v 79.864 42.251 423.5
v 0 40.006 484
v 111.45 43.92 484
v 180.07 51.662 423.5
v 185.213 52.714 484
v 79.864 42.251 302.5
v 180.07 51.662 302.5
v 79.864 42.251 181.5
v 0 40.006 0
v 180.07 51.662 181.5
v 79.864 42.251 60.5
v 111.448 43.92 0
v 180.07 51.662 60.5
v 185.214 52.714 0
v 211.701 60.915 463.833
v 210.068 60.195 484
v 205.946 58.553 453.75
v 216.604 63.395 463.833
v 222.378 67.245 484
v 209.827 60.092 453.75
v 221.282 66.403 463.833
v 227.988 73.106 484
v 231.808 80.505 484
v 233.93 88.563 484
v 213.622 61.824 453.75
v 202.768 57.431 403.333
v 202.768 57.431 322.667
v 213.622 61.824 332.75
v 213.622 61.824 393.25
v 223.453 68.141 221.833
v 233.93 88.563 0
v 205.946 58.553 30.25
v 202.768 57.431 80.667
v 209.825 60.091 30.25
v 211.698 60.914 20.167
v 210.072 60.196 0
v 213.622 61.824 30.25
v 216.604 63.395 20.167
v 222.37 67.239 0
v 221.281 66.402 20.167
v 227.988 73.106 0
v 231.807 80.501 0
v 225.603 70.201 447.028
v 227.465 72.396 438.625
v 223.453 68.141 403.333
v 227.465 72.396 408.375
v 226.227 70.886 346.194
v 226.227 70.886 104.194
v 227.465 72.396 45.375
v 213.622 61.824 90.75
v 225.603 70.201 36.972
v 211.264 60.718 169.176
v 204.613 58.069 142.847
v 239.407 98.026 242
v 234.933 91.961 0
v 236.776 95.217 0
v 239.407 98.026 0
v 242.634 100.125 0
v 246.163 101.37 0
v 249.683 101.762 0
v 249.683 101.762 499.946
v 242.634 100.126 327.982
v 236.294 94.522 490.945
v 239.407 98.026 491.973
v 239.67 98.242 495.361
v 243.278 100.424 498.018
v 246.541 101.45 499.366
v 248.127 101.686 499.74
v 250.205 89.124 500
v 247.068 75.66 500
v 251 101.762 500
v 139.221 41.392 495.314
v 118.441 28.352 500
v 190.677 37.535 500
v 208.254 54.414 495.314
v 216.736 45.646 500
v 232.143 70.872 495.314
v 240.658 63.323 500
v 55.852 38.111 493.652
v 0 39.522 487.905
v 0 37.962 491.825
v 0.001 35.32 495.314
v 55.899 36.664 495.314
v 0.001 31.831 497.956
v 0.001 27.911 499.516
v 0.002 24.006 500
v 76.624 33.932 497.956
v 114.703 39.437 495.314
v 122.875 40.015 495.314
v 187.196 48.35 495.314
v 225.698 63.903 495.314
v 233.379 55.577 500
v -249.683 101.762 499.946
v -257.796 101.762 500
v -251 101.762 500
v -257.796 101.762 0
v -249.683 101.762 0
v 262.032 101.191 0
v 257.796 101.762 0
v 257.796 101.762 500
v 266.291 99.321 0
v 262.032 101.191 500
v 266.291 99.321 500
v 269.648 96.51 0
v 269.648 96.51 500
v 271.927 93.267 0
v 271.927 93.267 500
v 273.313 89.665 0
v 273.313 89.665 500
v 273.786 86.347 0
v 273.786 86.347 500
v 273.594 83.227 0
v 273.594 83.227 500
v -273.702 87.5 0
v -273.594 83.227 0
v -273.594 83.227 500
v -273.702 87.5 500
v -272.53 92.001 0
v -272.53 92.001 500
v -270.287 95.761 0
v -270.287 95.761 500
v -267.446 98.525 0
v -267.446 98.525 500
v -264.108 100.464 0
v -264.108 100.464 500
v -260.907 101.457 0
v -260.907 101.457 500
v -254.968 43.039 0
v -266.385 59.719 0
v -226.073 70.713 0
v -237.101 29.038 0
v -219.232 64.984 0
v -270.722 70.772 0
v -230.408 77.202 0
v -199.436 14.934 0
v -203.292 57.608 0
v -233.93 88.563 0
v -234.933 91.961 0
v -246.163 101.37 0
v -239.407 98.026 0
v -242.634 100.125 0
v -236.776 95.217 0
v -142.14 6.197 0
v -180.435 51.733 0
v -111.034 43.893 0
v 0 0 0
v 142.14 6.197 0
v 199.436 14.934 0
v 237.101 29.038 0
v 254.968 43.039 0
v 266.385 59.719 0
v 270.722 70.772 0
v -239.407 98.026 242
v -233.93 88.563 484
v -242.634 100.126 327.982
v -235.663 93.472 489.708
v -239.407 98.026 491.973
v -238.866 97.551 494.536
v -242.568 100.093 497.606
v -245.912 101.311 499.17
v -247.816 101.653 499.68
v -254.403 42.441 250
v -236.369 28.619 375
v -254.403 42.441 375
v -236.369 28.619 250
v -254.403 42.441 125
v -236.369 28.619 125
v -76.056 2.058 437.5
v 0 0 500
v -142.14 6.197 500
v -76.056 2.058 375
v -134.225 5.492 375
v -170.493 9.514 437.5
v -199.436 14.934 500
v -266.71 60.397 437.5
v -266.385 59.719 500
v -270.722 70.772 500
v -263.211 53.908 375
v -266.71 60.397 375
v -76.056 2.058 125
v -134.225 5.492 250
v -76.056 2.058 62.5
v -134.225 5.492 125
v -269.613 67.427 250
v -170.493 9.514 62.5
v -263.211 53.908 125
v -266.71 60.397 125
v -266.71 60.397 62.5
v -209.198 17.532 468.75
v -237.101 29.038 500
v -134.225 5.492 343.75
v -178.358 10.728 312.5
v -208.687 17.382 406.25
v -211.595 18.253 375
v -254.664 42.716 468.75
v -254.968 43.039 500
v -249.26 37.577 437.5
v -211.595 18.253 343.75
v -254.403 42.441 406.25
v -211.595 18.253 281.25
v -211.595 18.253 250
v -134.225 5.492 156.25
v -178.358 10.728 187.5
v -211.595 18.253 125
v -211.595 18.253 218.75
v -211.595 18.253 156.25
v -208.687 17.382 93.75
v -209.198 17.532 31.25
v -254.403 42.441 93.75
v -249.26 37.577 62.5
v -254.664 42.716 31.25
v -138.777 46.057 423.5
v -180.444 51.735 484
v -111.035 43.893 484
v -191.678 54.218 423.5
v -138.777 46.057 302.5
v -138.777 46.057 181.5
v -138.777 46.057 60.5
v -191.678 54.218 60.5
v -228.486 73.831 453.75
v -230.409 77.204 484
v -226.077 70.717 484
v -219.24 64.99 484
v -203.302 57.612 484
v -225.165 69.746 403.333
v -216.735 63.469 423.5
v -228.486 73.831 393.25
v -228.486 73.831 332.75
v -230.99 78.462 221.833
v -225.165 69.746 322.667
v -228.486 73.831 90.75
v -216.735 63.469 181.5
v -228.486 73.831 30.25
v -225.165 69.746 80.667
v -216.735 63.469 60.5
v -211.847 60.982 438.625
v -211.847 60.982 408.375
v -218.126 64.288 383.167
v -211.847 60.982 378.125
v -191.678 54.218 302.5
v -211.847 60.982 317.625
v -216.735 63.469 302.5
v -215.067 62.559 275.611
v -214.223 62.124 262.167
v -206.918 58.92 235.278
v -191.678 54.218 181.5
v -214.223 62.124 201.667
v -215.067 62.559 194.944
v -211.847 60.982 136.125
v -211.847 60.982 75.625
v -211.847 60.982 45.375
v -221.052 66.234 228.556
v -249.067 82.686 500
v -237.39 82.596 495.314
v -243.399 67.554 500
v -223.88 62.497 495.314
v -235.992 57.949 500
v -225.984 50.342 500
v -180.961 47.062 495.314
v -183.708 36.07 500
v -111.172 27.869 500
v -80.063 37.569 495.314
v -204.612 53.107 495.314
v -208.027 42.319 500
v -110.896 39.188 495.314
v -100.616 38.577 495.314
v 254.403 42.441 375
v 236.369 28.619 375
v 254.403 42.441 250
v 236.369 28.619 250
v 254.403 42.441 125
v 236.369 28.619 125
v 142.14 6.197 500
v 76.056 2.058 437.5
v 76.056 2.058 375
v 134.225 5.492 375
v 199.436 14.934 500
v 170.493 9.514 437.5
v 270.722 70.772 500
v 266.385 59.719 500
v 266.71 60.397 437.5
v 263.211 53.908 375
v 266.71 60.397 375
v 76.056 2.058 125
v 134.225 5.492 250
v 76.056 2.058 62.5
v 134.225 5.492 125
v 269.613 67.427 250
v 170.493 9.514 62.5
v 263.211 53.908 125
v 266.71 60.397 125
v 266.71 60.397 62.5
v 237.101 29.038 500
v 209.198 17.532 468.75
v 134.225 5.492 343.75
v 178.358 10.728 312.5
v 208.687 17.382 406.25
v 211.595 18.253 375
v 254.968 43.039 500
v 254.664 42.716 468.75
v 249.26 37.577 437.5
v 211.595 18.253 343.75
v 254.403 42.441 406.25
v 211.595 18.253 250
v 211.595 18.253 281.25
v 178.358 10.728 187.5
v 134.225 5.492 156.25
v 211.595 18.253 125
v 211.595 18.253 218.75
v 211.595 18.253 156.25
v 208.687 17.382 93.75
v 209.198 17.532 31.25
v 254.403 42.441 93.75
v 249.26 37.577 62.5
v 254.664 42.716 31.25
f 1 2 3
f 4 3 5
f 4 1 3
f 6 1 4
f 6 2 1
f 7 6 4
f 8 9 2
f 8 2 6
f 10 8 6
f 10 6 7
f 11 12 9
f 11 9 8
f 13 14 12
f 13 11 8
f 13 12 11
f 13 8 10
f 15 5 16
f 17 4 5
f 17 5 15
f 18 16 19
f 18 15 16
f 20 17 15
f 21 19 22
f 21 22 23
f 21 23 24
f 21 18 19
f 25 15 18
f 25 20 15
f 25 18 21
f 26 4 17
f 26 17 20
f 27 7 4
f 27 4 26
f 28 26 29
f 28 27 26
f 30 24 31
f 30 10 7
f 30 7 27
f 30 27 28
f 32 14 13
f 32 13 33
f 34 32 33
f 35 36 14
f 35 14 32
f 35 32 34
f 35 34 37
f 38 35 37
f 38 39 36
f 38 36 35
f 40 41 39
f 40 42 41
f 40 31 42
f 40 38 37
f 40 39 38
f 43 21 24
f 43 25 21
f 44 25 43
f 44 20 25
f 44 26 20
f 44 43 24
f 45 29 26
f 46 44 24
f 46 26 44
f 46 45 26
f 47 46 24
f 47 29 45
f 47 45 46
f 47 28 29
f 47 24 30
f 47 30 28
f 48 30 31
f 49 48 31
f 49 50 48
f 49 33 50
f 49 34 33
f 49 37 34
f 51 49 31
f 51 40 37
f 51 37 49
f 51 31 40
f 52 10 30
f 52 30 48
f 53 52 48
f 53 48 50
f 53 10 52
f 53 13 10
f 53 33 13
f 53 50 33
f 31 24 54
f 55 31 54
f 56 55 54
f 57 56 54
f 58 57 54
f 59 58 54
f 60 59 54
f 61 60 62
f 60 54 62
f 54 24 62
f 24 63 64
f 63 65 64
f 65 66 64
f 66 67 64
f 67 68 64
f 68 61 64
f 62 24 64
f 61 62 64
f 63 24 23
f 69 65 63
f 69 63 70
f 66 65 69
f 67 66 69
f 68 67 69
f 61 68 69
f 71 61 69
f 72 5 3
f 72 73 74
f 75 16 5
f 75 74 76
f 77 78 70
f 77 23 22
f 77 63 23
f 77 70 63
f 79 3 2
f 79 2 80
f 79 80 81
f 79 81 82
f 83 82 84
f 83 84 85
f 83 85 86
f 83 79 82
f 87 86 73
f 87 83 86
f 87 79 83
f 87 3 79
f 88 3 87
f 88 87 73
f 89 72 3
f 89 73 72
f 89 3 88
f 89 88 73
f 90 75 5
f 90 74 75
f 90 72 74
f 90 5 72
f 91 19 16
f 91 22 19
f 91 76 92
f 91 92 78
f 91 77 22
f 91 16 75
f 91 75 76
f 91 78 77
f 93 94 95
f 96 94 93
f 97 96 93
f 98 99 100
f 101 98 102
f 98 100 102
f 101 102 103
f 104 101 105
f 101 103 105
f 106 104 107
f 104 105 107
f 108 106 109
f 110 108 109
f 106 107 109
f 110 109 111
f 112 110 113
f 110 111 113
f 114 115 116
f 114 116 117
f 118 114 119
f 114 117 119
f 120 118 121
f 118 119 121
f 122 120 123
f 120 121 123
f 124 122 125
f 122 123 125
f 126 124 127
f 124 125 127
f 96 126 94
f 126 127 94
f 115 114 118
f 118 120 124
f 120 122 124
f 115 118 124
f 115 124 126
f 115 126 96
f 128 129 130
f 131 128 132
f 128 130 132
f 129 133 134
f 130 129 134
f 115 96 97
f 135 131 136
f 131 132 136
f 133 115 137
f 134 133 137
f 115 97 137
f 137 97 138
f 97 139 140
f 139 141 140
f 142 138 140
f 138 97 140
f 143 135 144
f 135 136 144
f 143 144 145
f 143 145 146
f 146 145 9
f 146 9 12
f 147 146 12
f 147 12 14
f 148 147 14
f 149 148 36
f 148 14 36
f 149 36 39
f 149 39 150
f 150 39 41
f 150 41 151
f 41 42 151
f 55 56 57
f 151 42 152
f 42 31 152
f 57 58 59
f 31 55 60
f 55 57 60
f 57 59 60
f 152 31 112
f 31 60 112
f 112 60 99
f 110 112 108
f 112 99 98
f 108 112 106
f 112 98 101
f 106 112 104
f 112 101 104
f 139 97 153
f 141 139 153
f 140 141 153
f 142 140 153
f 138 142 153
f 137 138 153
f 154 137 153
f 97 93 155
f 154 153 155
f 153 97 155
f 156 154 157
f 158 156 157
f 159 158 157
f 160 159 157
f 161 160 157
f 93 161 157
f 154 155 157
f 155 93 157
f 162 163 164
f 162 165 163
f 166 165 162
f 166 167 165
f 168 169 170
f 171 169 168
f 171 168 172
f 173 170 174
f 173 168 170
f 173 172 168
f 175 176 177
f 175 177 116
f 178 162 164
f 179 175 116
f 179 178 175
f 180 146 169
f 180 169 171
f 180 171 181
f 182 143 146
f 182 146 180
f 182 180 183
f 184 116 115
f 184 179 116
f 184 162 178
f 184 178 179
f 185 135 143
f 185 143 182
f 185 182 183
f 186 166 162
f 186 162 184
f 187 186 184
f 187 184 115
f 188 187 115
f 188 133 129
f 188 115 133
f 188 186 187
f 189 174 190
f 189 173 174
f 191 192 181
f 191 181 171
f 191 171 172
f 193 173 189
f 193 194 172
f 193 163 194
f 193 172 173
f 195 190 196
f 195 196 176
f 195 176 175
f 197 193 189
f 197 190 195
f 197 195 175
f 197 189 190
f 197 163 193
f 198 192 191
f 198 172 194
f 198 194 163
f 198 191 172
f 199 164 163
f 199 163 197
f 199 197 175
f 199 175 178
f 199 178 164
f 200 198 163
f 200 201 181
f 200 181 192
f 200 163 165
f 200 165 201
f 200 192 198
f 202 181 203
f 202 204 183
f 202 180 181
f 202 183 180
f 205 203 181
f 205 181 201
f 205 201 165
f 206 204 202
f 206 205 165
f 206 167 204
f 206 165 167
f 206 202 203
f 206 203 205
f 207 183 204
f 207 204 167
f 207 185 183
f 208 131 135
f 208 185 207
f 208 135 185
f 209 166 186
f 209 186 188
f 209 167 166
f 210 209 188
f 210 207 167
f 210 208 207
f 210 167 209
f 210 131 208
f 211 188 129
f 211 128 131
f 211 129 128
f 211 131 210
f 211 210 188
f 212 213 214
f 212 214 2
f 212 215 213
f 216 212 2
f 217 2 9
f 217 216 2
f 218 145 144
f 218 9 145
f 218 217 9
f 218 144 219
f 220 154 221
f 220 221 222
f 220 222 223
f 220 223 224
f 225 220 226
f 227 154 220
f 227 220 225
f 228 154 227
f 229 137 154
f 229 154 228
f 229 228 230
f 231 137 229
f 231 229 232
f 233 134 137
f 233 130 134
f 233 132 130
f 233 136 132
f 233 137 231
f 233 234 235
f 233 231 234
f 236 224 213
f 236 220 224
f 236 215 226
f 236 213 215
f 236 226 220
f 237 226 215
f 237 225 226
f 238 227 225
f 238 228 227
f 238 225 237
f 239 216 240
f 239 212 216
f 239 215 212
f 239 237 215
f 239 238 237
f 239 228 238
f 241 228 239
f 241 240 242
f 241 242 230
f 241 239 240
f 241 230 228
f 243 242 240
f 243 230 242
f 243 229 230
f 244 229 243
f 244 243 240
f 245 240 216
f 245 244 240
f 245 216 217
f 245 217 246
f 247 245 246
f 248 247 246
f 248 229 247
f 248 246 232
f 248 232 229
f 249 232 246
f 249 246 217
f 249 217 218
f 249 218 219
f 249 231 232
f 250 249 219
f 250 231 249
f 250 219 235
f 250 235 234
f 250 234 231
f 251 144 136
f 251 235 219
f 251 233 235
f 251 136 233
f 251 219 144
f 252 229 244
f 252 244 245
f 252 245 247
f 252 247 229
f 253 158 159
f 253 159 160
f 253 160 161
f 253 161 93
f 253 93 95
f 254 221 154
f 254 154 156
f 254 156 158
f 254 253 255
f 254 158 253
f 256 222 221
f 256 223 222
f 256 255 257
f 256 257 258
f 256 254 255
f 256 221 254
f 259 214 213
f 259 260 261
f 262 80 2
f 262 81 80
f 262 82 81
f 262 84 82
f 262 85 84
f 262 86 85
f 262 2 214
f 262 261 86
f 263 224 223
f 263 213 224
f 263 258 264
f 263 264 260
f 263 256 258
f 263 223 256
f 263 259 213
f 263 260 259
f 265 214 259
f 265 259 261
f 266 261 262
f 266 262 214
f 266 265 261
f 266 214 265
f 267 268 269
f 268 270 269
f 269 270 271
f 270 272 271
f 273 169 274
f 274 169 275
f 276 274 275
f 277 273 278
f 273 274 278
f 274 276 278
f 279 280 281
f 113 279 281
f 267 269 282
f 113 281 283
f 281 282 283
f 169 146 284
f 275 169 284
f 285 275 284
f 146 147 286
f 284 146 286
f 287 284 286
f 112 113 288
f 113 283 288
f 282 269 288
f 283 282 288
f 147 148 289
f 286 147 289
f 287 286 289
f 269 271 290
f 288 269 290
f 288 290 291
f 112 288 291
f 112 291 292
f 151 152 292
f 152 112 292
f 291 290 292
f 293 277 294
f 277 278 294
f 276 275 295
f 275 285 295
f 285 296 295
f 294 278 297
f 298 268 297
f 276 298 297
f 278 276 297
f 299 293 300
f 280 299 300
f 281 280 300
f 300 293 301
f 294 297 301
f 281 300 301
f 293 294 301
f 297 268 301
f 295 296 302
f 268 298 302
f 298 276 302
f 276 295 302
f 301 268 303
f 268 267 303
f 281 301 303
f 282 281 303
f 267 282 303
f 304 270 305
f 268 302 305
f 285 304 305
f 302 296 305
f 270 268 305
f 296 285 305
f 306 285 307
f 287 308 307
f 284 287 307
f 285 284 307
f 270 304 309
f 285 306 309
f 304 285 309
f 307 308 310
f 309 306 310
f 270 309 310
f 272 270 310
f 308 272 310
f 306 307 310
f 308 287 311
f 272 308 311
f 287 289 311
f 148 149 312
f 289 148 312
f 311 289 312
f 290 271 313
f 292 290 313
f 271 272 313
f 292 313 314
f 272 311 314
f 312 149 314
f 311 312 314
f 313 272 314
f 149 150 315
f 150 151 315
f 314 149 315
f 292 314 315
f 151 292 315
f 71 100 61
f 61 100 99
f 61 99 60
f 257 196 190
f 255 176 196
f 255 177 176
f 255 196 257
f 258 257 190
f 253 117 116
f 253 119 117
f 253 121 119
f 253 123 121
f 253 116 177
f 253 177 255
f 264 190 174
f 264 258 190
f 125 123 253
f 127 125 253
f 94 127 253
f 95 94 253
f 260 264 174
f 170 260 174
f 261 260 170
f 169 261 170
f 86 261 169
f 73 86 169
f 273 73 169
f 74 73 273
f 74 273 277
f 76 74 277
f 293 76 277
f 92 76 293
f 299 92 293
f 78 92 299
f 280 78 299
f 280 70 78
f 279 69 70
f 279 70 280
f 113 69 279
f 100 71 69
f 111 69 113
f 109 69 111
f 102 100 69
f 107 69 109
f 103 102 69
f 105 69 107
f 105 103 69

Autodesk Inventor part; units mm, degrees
ref_plane "YZ Plane" through (0, 0, 0) normal (1, 0, 0) x (0, 1, 0)
ref_plane "XZ Plane" through (0, 0, 0) normal (0, 1, 0) x (-1, 0, 0)
ref_plane "XY Plane" through (0, 0, 0) normal (0, 0, 1) x (1, 0, 0)
sketch "Sketch1" plane through (0, 0, 0) normal (0, 0, 1) x (1, 0, 0)
  line L0 (0, 0) -> (-187.4869, 3.2416) construction
  line L1 (-187.4869, 3.2416) -> (-234.6064, 12.8161) construction
  line L2 (-234.6064, 12.8161) -> (-275, 37.6892) construction
  line L3 (-275, 37.6892) -> (-275, 101.7619) construction
  spline S0 degree 4 poles (0, 0) (-187.4869, 3.2416) (-234.6064, 12.8161) (-275, 37.6892) (-275, 101.7619) knots 1 1 1 1 1 2 2 2 2 2
  line L4 (0, 0) -> (0, 113.2924) construction
  line L5 (0, 0) -> (187.4869, 3.2416) construction
  line L6 (187.4869, 3.2416) -> (234.6064, 12.8161) construction
  line L7 (234.6064, 12.8161) -> (275, 37.6892) construction
  line L8 (275, 37.6892) -> (275, 101.7619) construction
  spline S1 degree 4 poles (0, 0) (187.4869, 3.2416) (234.6064, 12.8161) (275, 37.6892) (275, 101.7619) knots 1 1 1 1 1 2 2 2 2 2
  line L9 (-275, 101.7619) -> (-235, 101.7619)
  line L10 (275, 101.7619) -> (235, 101.7619)
  spline S2 degree 5 poles (-235, 101.7619) (-234.9998, 98.1416) (-234.829, 94.5189) (-234.4531, 90.9128) (-233.4432, 85.0816) (-231.5323, 79.4999) (-230.6428, 77.4013) (-228.5783, 73.5846) (-225.8087, 70.2481) (-224.3404, 68.804) (-220.2503, 65.3804) (-215.6211, 62.6959) (-212.6781, 61.2498) (-204.6005, 57.7948) (-196.1783, 55.2591) (-190.846, 53.8937) (-177.3264, 50.9118) (-163.6377, 48.8133) (-155.3667, 47.7495) (-135.3378, 45.5582) (-115.2425, 44.075) (-103.4552, 43.3581) (-75.702, 41.9491) (-47.9275, 41.0412) (-31.9532, 40.623) (-15.9771, 40.2844) (0, 40.006) knots 0 0 0 0 0 0 0.068525 0.068525 0.068525 0.111462 0.111462 0.111462 0.150213 0.150213 0.150213 0.212189 0.212189 0.212189 0.316307 0.316307 0.316307 0.474099 0.474099 0.474099 0.697579 0.697579 0.697579 1 1 1 1 1 1
  spline S3 degree 5 poles (0, 40.006) (15.9771, 40.2844) (31.9532, 40.623) (47.9275, 41.0412) (75.702, 41.9491) (103.4552, 43.3581) (115.2425, 44.075) (135.3378, 45.5582) (155.3667, 47.7495) (163.6377, 48.8133) (177.3264, 50.9118) (190.846, 53.8937) (196.1783, 55.2591) (204.6005, 57.7948) (212.6781, 61.2498) (215.6211, 62.6959) (220.2503, 65.3804) (224.3404, 68.804) (225.8087, 70.2481) (228.5783, 73.5846) (230.6428, 77.4013) (231.5323, 79.4999) (233.4432, 85.0816) (234.4531, 90.9128) (234.829, 94.5189) (234.9998, 98.1416) (235, 101.7619) knots 0 0 0 0 0 0 0.302421 0.302421 0.302421 0.525901 0.525901 0.525901 0.683693 0.683693 0.683693 0.787811 0.787811 0.787811 0.849787 0.849787 0.849787 0.888538 0.888538 0.888538 0.931475 0.931475 0.931475 1 1 1 1 1 1
  dimension "d3" = 40
  dimension "d0" = 275
extrude "Extrusion1" add sketch "Sketch1" along normal blind 500
fillet "Fillet1" radius 16 6 edges at (-275, 101.7619, 250) (-235, 101.7619, 250) (235, 101.7619, 250) (275, 101.7619, 250) (-131.9618, 45.4436, 500) (131.9618, 45.4436, 500)
properties part number "SeatBase"
